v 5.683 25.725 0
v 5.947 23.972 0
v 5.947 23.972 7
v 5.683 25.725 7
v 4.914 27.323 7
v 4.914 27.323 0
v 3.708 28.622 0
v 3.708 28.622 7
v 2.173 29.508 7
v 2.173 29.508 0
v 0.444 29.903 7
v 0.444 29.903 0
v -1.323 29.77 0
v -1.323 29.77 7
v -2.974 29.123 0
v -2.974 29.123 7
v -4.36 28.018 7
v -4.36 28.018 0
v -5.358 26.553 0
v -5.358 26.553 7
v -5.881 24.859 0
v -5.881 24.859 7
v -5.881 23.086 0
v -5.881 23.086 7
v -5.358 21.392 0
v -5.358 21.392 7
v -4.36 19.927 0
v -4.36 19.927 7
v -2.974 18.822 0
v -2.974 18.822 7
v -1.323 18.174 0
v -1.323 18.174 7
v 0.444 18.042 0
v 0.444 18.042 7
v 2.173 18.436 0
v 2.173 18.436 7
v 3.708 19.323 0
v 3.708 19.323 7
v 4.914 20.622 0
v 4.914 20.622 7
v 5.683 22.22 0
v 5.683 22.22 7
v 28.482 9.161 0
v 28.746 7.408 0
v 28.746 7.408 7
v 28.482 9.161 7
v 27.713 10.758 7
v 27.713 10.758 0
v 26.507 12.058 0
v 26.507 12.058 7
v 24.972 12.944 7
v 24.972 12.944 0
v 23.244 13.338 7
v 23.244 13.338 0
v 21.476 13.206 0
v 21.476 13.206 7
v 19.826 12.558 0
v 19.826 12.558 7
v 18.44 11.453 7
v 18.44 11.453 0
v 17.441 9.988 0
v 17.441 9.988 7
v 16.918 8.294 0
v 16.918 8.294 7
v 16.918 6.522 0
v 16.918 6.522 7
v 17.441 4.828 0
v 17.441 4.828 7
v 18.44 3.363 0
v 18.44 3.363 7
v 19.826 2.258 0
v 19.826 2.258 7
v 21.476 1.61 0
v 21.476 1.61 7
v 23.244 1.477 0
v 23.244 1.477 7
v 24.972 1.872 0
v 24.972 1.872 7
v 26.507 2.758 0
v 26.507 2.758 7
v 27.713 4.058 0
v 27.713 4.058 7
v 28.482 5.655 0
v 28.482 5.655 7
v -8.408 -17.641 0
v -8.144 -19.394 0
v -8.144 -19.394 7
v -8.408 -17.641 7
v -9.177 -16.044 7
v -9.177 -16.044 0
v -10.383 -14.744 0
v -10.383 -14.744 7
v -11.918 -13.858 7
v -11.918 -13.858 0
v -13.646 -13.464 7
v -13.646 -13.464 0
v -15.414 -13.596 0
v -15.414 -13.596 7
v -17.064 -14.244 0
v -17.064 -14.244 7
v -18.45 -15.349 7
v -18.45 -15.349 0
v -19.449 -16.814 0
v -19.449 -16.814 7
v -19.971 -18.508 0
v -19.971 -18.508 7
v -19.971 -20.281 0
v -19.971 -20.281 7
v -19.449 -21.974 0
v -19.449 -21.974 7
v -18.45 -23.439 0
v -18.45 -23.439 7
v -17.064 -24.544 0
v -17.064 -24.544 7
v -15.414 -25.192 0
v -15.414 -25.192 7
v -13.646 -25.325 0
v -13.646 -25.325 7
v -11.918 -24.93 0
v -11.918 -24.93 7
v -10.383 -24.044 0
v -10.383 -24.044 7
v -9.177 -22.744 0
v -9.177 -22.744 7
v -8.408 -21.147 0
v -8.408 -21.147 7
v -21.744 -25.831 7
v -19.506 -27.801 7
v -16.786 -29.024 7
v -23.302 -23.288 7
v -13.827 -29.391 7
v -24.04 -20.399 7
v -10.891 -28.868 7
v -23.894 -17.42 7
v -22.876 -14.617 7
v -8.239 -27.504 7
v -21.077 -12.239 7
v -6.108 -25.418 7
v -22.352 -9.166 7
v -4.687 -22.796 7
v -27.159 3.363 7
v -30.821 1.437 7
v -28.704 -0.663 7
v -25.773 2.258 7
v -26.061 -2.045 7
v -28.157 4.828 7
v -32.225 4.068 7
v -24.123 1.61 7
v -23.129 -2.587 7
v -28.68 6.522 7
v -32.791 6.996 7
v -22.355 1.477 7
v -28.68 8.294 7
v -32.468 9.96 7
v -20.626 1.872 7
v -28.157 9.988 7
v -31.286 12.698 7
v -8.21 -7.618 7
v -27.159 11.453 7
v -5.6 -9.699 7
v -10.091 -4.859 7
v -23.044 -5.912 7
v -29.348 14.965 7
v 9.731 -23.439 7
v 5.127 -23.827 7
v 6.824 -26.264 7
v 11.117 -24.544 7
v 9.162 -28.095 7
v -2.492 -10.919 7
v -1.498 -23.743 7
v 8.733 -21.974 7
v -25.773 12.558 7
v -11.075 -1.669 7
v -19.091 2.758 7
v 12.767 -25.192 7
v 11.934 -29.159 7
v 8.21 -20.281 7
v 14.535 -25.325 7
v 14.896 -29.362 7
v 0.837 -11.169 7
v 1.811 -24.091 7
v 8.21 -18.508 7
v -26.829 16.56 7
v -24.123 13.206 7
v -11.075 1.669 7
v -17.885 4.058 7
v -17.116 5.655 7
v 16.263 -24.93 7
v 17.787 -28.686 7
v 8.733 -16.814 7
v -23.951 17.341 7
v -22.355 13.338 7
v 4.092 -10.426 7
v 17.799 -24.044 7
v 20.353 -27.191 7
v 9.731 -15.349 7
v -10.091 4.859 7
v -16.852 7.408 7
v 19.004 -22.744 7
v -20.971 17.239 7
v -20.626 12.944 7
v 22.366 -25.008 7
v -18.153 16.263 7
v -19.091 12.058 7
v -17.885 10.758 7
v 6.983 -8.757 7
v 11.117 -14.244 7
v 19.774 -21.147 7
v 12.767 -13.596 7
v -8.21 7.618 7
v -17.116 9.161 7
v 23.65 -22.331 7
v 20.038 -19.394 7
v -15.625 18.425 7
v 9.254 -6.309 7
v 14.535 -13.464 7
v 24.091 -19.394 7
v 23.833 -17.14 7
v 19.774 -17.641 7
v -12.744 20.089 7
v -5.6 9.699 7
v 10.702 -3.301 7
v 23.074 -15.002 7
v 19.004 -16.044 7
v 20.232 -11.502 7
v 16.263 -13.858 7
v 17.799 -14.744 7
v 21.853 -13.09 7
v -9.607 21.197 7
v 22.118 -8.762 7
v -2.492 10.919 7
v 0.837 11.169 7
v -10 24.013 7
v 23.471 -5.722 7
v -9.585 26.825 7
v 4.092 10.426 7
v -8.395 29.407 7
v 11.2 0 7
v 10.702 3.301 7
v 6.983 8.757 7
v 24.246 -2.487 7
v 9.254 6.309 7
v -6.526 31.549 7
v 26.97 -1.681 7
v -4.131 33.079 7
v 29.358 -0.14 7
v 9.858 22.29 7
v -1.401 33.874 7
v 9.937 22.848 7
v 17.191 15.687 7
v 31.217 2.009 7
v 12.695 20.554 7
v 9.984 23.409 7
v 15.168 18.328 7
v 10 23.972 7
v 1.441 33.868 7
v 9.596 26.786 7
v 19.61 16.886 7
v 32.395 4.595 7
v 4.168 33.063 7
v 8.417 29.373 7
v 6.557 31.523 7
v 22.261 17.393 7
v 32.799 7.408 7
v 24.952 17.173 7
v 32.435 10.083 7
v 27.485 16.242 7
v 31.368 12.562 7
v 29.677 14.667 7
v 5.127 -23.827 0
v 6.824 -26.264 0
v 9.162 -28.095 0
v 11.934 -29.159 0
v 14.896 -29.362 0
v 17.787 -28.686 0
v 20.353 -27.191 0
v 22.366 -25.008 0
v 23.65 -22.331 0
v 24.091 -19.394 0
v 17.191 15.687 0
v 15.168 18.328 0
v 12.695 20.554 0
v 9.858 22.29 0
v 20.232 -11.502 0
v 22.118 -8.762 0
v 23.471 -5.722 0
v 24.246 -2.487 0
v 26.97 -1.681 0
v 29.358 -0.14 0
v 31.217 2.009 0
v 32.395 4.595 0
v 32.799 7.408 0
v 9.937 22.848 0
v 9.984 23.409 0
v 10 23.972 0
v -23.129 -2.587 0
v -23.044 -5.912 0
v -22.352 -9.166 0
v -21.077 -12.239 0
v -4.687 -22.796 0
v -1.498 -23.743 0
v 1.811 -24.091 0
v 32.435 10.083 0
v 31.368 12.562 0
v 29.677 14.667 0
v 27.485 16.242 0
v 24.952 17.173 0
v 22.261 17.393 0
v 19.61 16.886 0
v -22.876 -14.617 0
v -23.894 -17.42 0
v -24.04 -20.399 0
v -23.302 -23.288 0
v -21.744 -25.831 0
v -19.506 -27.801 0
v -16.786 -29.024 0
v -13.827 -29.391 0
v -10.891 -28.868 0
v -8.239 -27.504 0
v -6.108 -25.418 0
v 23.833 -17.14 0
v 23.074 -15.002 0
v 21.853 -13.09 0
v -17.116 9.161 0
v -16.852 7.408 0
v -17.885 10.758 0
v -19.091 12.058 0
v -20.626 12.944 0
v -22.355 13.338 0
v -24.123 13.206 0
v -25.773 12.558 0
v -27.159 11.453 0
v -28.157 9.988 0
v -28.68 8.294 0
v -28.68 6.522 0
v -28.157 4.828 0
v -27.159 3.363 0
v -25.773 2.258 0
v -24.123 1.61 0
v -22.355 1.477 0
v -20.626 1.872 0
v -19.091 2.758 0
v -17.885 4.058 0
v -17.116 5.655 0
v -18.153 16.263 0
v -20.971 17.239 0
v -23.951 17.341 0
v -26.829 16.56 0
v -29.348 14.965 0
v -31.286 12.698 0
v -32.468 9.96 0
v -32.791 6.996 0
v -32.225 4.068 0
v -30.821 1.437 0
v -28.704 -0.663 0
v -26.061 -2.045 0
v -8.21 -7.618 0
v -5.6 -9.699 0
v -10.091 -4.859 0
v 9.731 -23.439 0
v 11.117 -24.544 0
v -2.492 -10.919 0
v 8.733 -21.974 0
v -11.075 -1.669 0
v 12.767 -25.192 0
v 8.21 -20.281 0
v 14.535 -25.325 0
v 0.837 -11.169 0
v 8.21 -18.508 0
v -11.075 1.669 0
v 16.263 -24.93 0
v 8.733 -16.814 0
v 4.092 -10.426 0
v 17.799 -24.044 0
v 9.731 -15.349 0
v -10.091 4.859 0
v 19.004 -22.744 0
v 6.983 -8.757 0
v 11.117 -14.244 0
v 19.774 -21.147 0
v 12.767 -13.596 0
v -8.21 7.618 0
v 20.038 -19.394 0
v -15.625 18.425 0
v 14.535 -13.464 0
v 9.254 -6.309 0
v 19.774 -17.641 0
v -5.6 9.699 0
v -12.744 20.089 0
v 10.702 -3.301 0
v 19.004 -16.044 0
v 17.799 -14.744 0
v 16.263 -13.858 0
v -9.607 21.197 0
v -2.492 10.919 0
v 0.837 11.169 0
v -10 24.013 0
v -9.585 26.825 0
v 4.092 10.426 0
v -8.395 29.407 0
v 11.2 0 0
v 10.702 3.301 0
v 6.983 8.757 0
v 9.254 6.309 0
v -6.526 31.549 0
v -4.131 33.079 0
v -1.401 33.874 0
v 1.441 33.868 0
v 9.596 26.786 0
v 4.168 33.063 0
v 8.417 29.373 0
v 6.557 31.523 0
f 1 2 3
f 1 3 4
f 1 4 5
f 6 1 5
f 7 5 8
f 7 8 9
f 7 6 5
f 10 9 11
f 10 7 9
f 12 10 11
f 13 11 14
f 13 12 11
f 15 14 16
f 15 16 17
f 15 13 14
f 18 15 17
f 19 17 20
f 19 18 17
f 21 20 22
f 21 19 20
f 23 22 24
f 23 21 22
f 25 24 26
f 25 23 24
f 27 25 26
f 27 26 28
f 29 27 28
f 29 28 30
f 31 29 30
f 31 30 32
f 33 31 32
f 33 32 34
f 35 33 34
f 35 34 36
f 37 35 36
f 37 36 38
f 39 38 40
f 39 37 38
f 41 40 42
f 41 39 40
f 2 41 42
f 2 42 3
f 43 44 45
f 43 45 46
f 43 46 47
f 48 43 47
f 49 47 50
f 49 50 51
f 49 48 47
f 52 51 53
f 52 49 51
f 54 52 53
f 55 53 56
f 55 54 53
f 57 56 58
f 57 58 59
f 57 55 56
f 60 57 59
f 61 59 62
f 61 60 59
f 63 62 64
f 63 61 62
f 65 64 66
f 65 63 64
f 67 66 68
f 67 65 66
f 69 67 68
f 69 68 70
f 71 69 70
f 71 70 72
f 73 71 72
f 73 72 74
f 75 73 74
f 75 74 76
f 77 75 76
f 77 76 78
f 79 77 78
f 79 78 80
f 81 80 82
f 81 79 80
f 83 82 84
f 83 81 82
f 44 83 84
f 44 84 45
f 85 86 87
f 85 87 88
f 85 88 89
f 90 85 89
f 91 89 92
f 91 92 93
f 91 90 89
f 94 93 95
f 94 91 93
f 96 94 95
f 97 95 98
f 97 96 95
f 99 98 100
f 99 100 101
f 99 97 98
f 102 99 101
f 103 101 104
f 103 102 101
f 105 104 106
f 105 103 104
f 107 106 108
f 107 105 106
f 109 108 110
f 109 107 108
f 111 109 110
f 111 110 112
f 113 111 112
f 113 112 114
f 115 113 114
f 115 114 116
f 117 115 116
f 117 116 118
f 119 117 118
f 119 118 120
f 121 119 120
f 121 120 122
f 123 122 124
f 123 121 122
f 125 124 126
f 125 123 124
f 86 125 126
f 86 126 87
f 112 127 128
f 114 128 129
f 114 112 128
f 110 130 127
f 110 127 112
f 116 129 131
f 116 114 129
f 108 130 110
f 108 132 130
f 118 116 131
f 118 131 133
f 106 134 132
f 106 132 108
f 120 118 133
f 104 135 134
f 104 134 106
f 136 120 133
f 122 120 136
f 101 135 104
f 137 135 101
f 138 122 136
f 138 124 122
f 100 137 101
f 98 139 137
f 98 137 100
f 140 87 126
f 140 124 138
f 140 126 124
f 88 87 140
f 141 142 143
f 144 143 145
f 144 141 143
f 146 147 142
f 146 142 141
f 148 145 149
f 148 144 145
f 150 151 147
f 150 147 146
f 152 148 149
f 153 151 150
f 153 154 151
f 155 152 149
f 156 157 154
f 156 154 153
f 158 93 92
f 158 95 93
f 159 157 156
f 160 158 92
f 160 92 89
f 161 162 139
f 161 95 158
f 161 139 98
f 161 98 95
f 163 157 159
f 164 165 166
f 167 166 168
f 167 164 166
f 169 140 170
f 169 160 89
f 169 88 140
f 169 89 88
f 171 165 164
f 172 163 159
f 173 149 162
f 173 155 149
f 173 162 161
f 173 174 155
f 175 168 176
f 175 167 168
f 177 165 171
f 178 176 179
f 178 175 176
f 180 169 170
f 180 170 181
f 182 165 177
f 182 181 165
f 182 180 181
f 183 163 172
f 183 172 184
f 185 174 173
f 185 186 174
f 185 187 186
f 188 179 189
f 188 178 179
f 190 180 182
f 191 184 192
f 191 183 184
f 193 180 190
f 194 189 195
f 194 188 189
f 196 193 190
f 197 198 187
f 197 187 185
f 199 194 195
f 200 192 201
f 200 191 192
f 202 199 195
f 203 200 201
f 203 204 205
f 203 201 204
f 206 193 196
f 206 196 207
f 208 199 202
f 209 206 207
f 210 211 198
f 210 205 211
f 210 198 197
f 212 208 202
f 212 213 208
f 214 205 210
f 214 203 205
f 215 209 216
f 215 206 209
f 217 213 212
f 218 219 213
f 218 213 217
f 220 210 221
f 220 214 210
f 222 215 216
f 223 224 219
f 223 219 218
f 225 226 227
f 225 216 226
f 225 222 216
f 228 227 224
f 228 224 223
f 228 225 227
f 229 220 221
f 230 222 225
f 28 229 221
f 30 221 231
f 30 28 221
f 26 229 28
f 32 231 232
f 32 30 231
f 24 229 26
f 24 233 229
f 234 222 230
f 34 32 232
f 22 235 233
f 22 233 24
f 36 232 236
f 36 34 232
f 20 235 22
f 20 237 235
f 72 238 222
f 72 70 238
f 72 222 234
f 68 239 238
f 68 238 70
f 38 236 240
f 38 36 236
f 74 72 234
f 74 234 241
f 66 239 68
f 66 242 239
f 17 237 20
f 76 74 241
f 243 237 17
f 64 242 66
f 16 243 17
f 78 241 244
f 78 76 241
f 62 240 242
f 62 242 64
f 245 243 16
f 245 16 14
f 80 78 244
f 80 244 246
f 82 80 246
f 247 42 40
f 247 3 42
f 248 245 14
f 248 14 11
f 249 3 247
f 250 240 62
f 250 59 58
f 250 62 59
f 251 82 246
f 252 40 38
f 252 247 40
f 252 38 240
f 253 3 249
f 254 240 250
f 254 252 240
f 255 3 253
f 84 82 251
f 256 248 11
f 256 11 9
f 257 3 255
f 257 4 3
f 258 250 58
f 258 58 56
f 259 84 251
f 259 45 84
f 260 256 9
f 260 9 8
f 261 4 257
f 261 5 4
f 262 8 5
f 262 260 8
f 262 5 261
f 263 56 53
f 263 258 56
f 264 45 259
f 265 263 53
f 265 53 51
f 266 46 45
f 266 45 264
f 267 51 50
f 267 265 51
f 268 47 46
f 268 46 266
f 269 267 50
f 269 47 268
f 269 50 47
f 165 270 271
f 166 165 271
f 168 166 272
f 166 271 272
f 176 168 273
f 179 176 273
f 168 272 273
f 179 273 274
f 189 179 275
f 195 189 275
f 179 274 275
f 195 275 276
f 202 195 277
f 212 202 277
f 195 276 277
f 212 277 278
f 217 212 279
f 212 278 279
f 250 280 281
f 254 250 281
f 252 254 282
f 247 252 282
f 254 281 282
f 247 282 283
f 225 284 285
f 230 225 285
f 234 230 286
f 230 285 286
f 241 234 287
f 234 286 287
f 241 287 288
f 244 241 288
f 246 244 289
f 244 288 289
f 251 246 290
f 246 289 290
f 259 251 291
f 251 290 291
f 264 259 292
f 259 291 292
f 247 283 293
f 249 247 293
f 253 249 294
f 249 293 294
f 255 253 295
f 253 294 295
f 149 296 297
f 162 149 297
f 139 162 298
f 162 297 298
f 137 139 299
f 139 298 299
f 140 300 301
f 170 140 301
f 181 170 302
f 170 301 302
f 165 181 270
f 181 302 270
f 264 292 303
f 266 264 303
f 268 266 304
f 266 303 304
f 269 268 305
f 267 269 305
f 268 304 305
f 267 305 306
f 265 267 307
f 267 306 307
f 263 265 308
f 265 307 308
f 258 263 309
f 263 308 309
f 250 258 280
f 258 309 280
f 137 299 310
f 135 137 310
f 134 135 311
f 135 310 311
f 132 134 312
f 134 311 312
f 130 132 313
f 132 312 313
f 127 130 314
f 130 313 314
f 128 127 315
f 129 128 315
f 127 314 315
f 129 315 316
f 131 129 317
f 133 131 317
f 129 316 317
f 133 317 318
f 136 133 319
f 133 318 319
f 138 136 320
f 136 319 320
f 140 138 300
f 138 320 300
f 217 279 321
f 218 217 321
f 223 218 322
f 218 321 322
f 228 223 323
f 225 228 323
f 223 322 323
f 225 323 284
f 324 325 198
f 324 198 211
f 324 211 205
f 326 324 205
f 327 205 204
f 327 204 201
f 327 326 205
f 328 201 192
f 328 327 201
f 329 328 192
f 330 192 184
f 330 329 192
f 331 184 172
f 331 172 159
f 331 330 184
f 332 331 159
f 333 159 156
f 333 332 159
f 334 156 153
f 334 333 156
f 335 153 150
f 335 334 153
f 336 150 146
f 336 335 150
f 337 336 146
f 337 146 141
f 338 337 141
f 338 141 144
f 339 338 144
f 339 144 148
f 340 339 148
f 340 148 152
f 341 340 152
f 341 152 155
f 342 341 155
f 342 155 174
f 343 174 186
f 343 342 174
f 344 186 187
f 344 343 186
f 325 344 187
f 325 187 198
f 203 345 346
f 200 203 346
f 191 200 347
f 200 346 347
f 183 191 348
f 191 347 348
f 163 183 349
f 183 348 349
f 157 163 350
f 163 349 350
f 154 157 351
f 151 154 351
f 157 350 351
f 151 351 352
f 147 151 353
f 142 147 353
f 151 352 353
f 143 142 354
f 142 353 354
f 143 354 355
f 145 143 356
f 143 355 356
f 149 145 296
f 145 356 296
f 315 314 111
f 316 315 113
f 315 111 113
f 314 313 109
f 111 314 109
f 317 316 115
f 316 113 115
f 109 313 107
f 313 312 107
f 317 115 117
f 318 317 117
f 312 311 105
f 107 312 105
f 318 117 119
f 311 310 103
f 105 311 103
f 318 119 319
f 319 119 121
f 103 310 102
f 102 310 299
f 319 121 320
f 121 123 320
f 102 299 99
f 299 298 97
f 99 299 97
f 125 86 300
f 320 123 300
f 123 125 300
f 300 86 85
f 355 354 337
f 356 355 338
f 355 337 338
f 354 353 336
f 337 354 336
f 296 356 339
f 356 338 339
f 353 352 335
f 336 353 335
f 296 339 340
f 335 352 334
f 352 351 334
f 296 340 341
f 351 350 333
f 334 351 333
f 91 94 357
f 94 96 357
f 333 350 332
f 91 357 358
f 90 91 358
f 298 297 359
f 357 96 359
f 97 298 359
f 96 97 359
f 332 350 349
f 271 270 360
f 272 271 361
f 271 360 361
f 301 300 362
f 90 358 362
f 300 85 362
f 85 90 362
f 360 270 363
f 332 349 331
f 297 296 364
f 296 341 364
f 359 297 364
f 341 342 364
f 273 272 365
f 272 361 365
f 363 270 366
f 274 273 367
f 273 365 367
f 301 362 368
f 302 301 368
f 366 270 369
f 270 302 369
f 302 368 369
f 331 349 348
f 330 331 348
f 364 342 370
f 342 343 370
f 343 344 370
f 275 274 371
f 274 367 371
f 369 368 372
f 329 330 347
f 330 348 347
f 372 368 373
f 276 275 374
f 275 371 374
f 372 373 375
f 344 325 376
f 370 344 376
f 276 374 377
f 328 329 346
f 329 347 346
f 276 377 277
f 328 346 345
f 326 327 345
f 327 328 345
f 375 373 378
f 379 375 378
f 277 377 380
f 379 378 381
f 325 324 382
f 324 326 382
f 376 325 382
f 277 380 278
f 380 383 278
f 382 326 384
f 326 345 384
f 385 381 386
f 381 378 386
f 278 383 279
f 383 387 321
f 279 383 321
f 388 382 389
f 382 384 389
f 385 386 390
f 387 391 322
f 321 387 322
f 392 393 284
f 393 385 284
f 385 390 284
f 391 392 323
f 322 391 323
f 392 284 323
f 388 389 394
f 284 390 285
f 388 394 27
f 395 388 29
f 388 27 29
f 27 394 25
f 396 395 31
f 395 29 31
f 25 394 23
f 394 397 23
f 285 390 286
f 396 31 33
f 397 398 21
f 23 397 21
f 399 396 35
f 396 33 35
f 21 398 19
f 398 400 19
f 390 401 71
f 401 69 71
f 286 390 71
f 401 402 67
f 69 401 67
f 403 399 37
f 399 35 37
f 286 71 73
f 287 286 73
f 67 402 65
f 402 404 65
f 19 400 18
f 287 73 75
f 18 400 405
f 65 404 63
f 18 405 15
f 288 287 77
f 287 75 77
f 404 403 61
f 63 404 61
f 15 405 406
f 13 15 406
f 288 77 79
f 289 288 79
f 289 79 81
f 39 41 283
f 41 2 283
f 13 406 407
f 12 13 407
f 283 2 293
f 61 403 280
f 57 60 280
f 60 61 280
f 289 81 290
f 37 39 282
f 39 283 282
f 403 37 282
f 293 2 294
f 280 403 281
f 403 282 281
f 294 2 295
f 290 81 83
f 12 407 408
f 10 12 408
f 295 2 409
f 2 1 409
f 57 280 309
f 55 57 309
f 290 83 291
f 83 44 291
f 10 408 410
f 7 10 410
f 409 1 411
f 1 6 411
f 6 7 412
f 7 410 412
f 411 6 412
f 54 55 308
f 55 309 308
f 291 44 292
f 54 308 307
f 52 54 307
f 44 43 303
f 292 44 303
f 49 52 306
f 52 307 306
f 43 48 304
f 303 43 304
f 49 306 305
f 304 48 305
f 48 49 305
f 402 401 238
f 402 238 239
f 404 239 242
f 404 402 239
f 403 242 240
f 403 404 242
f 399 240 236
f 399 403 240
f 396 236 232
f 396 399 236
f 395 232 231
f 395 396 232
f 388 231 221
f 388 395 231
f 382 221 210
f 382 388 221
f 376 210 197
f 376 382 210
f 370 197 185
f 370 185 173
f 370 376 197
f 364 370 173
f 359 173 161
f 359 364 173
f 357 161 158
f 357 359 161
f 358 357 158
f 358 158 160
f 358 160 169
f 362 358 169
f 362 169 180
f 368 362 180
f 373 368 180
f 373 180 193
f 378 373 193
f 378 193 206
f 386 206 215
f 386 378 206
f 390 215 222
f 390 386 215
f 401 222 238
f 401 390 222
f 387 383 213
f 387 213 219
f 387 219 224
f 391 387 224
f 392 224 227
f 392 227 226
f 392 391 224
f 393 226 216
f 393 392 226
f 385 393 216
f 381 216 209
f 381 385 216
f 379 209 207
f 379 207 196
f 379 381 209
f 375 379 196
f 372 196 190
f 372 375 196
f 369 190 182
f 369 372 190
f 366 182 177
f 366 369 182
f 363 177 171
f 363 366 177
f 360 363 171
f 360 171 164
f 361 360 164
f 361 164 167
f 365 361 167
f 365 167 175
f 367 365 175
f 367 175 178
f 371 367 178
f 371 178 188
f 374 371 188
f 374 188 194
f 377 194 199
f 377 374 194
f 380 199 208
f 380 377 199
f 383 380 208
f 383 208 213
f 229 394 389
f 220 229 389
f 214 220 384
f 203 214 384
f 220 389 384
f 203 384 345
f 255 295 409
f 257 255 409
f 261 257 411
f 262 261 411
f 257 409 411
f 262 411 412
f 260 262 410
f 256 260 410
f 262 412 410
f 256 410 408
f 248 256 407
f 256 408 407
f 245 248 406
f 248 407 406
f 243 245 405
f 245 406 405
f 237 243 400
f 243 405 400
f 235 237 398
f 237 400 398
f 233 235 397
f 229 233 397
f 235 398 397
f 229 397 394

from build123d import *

# Parameters (mm, degrees)
F0_R     = 5.947106
F0_R_2   = 11.2
F1_DEPTH = 7


with BuildPart() as f1:
    # F0 (on Top) → F1 (new body)
    with BuildSketch(Plane.XY):
        with BuildLine():
            ThreePointArc((-12.799167, 7.407898), (-14.24174, 12.581914), (-18.153254, 16.263151))
            ThreePointArc((-18.153254, 16.263151), (-32.468011, 9.960046), (-23.128774, -2.586668))
            ThreePointArc((-23.128774, -2.586668), (-15.845609, 0.221242), (-12.799167, 7.407898))
        make_face()
        with Locations((-22.799167, 7.407898)):
            Circle(F0_R, mode=Mode.SUBTRACT)
        with BuildLine():
            ThreePointArc((9.857511, 22.29036), (9.964314, 23.1284), (10, 23.972463))
            ThreePointArc((10, 23.972463), (-1.401336, 33.873789), (-9.607252, 21.197447))
            ThreePointArc((-9.607252, 21.197447), (0.5606, 13.988189), (9.857511, 22.29036))
        make_face()
        with Locations((0, 23.972463)):
            Circle(F0_R, mode=Mode.SUBTRACT)
        with BuildLine():
            ThreePointArc((32.799167, 7.407898), (27.485316, 16.241924), (17.191166, 15.687411))
            ThreePointArc((17.191166, 15.687411), (13.476793, 3.789426), (24.245531, -2.48695))
            ThreePointArc((24.245531, -2.48695), (30.364339, 0.86816), (32.799167, 7.407898))
        make_face()
        with Locations((22.799167, 7.407898)):
            Circle(F0_R, mode=Mode.SUBTRACT)
        with BuildLine():
            ThreePointArc((24.09066, -19.39413), (23.074344, -15.001702), (20.231977, -11.502094))
            ThreePointArc((20.231977, -11.502094), (7.768516, -11.646195), (5.127051, -23.82738))
            ThreePointArc((5.127051, -23.82738), (16.367051, -29.131586), (24.09066, -19.39413))
        make_face()
        with Locations((14.09066, -19.39413)):
            Circle(F0_R, mode=Mode.SUBTRACT)
        with BuildLine():
            ThreePointArc((-4.09066, -19.39413), (-10.208766, -10.178334), (-21.076839, -12.239181))
            ThreePointArc((-21.076839, -12.239181), (-19.505734, -27.80109), (-4.687117, -22.796096))
            ThreePointArc((-4.687117, -22.796096), (-4.240903, -21.121059), (-4.09066, -19.39413))
        make_face()
        with Locations((-14.09066, -19.39413)):
            Circle(F0_R, mode=Mode.SUBTRACT)
        with BuildLine():
            ThreePointArc((9.857511, 22.29036), (0.5606, 13.988189), (-9.607252, 21.197447))
            ThreePointArc((-9.607252, 21.197447), (-14.222694, 19.323393), (-18.153254, 16.263151))
            ThreePointArc((-18.153254, 16.263151), (-14.24174, 12.581914), (-12.799167, 7.407898))
            ThreePointArc((-12.799167, 7.407898), (-15.845609, 0.221242), (-23.128774, -2.586668))
            ThreePointArc((-23.128774, -2.586668), (-22.772693, -7.555329), (-21.076839, -12.239181))
            ThreePointArc((-21.076839, -12.239181), (-10.208766, -10.178334), (-4.09066, -19.39413))
            ThreePointArc((-4.09066, -19.39413), (-4.240903, -21.121059), (-4.687117, -22.796096))
            ThreePointArc((-4.687117, -22.796096), (0.148396, -23.992843), (5.127051, -23.82738))
            ThreePointArc((5.127051, -23.82738), (7.768516, -11.646195), (20.231977, -11.502094))
            ThreePointArc((20.231977, -11.502094), (22.864407, -7.273064), (24.245531, -2.48695))
            ThreePointArc((24.245531, -2.48695), (13.476793, 3.789426), (17.191166, 15.687411))
            ThreePointArc((17.191166, 15.687411), (13.982585, 19.497843), (9.857511, 22.29036))
        make_face()
        Circle(F0_R_2, mode=Mode.SUBTRACT)
    extrude(amount=F1_DEPTH)


solid = f1.part
